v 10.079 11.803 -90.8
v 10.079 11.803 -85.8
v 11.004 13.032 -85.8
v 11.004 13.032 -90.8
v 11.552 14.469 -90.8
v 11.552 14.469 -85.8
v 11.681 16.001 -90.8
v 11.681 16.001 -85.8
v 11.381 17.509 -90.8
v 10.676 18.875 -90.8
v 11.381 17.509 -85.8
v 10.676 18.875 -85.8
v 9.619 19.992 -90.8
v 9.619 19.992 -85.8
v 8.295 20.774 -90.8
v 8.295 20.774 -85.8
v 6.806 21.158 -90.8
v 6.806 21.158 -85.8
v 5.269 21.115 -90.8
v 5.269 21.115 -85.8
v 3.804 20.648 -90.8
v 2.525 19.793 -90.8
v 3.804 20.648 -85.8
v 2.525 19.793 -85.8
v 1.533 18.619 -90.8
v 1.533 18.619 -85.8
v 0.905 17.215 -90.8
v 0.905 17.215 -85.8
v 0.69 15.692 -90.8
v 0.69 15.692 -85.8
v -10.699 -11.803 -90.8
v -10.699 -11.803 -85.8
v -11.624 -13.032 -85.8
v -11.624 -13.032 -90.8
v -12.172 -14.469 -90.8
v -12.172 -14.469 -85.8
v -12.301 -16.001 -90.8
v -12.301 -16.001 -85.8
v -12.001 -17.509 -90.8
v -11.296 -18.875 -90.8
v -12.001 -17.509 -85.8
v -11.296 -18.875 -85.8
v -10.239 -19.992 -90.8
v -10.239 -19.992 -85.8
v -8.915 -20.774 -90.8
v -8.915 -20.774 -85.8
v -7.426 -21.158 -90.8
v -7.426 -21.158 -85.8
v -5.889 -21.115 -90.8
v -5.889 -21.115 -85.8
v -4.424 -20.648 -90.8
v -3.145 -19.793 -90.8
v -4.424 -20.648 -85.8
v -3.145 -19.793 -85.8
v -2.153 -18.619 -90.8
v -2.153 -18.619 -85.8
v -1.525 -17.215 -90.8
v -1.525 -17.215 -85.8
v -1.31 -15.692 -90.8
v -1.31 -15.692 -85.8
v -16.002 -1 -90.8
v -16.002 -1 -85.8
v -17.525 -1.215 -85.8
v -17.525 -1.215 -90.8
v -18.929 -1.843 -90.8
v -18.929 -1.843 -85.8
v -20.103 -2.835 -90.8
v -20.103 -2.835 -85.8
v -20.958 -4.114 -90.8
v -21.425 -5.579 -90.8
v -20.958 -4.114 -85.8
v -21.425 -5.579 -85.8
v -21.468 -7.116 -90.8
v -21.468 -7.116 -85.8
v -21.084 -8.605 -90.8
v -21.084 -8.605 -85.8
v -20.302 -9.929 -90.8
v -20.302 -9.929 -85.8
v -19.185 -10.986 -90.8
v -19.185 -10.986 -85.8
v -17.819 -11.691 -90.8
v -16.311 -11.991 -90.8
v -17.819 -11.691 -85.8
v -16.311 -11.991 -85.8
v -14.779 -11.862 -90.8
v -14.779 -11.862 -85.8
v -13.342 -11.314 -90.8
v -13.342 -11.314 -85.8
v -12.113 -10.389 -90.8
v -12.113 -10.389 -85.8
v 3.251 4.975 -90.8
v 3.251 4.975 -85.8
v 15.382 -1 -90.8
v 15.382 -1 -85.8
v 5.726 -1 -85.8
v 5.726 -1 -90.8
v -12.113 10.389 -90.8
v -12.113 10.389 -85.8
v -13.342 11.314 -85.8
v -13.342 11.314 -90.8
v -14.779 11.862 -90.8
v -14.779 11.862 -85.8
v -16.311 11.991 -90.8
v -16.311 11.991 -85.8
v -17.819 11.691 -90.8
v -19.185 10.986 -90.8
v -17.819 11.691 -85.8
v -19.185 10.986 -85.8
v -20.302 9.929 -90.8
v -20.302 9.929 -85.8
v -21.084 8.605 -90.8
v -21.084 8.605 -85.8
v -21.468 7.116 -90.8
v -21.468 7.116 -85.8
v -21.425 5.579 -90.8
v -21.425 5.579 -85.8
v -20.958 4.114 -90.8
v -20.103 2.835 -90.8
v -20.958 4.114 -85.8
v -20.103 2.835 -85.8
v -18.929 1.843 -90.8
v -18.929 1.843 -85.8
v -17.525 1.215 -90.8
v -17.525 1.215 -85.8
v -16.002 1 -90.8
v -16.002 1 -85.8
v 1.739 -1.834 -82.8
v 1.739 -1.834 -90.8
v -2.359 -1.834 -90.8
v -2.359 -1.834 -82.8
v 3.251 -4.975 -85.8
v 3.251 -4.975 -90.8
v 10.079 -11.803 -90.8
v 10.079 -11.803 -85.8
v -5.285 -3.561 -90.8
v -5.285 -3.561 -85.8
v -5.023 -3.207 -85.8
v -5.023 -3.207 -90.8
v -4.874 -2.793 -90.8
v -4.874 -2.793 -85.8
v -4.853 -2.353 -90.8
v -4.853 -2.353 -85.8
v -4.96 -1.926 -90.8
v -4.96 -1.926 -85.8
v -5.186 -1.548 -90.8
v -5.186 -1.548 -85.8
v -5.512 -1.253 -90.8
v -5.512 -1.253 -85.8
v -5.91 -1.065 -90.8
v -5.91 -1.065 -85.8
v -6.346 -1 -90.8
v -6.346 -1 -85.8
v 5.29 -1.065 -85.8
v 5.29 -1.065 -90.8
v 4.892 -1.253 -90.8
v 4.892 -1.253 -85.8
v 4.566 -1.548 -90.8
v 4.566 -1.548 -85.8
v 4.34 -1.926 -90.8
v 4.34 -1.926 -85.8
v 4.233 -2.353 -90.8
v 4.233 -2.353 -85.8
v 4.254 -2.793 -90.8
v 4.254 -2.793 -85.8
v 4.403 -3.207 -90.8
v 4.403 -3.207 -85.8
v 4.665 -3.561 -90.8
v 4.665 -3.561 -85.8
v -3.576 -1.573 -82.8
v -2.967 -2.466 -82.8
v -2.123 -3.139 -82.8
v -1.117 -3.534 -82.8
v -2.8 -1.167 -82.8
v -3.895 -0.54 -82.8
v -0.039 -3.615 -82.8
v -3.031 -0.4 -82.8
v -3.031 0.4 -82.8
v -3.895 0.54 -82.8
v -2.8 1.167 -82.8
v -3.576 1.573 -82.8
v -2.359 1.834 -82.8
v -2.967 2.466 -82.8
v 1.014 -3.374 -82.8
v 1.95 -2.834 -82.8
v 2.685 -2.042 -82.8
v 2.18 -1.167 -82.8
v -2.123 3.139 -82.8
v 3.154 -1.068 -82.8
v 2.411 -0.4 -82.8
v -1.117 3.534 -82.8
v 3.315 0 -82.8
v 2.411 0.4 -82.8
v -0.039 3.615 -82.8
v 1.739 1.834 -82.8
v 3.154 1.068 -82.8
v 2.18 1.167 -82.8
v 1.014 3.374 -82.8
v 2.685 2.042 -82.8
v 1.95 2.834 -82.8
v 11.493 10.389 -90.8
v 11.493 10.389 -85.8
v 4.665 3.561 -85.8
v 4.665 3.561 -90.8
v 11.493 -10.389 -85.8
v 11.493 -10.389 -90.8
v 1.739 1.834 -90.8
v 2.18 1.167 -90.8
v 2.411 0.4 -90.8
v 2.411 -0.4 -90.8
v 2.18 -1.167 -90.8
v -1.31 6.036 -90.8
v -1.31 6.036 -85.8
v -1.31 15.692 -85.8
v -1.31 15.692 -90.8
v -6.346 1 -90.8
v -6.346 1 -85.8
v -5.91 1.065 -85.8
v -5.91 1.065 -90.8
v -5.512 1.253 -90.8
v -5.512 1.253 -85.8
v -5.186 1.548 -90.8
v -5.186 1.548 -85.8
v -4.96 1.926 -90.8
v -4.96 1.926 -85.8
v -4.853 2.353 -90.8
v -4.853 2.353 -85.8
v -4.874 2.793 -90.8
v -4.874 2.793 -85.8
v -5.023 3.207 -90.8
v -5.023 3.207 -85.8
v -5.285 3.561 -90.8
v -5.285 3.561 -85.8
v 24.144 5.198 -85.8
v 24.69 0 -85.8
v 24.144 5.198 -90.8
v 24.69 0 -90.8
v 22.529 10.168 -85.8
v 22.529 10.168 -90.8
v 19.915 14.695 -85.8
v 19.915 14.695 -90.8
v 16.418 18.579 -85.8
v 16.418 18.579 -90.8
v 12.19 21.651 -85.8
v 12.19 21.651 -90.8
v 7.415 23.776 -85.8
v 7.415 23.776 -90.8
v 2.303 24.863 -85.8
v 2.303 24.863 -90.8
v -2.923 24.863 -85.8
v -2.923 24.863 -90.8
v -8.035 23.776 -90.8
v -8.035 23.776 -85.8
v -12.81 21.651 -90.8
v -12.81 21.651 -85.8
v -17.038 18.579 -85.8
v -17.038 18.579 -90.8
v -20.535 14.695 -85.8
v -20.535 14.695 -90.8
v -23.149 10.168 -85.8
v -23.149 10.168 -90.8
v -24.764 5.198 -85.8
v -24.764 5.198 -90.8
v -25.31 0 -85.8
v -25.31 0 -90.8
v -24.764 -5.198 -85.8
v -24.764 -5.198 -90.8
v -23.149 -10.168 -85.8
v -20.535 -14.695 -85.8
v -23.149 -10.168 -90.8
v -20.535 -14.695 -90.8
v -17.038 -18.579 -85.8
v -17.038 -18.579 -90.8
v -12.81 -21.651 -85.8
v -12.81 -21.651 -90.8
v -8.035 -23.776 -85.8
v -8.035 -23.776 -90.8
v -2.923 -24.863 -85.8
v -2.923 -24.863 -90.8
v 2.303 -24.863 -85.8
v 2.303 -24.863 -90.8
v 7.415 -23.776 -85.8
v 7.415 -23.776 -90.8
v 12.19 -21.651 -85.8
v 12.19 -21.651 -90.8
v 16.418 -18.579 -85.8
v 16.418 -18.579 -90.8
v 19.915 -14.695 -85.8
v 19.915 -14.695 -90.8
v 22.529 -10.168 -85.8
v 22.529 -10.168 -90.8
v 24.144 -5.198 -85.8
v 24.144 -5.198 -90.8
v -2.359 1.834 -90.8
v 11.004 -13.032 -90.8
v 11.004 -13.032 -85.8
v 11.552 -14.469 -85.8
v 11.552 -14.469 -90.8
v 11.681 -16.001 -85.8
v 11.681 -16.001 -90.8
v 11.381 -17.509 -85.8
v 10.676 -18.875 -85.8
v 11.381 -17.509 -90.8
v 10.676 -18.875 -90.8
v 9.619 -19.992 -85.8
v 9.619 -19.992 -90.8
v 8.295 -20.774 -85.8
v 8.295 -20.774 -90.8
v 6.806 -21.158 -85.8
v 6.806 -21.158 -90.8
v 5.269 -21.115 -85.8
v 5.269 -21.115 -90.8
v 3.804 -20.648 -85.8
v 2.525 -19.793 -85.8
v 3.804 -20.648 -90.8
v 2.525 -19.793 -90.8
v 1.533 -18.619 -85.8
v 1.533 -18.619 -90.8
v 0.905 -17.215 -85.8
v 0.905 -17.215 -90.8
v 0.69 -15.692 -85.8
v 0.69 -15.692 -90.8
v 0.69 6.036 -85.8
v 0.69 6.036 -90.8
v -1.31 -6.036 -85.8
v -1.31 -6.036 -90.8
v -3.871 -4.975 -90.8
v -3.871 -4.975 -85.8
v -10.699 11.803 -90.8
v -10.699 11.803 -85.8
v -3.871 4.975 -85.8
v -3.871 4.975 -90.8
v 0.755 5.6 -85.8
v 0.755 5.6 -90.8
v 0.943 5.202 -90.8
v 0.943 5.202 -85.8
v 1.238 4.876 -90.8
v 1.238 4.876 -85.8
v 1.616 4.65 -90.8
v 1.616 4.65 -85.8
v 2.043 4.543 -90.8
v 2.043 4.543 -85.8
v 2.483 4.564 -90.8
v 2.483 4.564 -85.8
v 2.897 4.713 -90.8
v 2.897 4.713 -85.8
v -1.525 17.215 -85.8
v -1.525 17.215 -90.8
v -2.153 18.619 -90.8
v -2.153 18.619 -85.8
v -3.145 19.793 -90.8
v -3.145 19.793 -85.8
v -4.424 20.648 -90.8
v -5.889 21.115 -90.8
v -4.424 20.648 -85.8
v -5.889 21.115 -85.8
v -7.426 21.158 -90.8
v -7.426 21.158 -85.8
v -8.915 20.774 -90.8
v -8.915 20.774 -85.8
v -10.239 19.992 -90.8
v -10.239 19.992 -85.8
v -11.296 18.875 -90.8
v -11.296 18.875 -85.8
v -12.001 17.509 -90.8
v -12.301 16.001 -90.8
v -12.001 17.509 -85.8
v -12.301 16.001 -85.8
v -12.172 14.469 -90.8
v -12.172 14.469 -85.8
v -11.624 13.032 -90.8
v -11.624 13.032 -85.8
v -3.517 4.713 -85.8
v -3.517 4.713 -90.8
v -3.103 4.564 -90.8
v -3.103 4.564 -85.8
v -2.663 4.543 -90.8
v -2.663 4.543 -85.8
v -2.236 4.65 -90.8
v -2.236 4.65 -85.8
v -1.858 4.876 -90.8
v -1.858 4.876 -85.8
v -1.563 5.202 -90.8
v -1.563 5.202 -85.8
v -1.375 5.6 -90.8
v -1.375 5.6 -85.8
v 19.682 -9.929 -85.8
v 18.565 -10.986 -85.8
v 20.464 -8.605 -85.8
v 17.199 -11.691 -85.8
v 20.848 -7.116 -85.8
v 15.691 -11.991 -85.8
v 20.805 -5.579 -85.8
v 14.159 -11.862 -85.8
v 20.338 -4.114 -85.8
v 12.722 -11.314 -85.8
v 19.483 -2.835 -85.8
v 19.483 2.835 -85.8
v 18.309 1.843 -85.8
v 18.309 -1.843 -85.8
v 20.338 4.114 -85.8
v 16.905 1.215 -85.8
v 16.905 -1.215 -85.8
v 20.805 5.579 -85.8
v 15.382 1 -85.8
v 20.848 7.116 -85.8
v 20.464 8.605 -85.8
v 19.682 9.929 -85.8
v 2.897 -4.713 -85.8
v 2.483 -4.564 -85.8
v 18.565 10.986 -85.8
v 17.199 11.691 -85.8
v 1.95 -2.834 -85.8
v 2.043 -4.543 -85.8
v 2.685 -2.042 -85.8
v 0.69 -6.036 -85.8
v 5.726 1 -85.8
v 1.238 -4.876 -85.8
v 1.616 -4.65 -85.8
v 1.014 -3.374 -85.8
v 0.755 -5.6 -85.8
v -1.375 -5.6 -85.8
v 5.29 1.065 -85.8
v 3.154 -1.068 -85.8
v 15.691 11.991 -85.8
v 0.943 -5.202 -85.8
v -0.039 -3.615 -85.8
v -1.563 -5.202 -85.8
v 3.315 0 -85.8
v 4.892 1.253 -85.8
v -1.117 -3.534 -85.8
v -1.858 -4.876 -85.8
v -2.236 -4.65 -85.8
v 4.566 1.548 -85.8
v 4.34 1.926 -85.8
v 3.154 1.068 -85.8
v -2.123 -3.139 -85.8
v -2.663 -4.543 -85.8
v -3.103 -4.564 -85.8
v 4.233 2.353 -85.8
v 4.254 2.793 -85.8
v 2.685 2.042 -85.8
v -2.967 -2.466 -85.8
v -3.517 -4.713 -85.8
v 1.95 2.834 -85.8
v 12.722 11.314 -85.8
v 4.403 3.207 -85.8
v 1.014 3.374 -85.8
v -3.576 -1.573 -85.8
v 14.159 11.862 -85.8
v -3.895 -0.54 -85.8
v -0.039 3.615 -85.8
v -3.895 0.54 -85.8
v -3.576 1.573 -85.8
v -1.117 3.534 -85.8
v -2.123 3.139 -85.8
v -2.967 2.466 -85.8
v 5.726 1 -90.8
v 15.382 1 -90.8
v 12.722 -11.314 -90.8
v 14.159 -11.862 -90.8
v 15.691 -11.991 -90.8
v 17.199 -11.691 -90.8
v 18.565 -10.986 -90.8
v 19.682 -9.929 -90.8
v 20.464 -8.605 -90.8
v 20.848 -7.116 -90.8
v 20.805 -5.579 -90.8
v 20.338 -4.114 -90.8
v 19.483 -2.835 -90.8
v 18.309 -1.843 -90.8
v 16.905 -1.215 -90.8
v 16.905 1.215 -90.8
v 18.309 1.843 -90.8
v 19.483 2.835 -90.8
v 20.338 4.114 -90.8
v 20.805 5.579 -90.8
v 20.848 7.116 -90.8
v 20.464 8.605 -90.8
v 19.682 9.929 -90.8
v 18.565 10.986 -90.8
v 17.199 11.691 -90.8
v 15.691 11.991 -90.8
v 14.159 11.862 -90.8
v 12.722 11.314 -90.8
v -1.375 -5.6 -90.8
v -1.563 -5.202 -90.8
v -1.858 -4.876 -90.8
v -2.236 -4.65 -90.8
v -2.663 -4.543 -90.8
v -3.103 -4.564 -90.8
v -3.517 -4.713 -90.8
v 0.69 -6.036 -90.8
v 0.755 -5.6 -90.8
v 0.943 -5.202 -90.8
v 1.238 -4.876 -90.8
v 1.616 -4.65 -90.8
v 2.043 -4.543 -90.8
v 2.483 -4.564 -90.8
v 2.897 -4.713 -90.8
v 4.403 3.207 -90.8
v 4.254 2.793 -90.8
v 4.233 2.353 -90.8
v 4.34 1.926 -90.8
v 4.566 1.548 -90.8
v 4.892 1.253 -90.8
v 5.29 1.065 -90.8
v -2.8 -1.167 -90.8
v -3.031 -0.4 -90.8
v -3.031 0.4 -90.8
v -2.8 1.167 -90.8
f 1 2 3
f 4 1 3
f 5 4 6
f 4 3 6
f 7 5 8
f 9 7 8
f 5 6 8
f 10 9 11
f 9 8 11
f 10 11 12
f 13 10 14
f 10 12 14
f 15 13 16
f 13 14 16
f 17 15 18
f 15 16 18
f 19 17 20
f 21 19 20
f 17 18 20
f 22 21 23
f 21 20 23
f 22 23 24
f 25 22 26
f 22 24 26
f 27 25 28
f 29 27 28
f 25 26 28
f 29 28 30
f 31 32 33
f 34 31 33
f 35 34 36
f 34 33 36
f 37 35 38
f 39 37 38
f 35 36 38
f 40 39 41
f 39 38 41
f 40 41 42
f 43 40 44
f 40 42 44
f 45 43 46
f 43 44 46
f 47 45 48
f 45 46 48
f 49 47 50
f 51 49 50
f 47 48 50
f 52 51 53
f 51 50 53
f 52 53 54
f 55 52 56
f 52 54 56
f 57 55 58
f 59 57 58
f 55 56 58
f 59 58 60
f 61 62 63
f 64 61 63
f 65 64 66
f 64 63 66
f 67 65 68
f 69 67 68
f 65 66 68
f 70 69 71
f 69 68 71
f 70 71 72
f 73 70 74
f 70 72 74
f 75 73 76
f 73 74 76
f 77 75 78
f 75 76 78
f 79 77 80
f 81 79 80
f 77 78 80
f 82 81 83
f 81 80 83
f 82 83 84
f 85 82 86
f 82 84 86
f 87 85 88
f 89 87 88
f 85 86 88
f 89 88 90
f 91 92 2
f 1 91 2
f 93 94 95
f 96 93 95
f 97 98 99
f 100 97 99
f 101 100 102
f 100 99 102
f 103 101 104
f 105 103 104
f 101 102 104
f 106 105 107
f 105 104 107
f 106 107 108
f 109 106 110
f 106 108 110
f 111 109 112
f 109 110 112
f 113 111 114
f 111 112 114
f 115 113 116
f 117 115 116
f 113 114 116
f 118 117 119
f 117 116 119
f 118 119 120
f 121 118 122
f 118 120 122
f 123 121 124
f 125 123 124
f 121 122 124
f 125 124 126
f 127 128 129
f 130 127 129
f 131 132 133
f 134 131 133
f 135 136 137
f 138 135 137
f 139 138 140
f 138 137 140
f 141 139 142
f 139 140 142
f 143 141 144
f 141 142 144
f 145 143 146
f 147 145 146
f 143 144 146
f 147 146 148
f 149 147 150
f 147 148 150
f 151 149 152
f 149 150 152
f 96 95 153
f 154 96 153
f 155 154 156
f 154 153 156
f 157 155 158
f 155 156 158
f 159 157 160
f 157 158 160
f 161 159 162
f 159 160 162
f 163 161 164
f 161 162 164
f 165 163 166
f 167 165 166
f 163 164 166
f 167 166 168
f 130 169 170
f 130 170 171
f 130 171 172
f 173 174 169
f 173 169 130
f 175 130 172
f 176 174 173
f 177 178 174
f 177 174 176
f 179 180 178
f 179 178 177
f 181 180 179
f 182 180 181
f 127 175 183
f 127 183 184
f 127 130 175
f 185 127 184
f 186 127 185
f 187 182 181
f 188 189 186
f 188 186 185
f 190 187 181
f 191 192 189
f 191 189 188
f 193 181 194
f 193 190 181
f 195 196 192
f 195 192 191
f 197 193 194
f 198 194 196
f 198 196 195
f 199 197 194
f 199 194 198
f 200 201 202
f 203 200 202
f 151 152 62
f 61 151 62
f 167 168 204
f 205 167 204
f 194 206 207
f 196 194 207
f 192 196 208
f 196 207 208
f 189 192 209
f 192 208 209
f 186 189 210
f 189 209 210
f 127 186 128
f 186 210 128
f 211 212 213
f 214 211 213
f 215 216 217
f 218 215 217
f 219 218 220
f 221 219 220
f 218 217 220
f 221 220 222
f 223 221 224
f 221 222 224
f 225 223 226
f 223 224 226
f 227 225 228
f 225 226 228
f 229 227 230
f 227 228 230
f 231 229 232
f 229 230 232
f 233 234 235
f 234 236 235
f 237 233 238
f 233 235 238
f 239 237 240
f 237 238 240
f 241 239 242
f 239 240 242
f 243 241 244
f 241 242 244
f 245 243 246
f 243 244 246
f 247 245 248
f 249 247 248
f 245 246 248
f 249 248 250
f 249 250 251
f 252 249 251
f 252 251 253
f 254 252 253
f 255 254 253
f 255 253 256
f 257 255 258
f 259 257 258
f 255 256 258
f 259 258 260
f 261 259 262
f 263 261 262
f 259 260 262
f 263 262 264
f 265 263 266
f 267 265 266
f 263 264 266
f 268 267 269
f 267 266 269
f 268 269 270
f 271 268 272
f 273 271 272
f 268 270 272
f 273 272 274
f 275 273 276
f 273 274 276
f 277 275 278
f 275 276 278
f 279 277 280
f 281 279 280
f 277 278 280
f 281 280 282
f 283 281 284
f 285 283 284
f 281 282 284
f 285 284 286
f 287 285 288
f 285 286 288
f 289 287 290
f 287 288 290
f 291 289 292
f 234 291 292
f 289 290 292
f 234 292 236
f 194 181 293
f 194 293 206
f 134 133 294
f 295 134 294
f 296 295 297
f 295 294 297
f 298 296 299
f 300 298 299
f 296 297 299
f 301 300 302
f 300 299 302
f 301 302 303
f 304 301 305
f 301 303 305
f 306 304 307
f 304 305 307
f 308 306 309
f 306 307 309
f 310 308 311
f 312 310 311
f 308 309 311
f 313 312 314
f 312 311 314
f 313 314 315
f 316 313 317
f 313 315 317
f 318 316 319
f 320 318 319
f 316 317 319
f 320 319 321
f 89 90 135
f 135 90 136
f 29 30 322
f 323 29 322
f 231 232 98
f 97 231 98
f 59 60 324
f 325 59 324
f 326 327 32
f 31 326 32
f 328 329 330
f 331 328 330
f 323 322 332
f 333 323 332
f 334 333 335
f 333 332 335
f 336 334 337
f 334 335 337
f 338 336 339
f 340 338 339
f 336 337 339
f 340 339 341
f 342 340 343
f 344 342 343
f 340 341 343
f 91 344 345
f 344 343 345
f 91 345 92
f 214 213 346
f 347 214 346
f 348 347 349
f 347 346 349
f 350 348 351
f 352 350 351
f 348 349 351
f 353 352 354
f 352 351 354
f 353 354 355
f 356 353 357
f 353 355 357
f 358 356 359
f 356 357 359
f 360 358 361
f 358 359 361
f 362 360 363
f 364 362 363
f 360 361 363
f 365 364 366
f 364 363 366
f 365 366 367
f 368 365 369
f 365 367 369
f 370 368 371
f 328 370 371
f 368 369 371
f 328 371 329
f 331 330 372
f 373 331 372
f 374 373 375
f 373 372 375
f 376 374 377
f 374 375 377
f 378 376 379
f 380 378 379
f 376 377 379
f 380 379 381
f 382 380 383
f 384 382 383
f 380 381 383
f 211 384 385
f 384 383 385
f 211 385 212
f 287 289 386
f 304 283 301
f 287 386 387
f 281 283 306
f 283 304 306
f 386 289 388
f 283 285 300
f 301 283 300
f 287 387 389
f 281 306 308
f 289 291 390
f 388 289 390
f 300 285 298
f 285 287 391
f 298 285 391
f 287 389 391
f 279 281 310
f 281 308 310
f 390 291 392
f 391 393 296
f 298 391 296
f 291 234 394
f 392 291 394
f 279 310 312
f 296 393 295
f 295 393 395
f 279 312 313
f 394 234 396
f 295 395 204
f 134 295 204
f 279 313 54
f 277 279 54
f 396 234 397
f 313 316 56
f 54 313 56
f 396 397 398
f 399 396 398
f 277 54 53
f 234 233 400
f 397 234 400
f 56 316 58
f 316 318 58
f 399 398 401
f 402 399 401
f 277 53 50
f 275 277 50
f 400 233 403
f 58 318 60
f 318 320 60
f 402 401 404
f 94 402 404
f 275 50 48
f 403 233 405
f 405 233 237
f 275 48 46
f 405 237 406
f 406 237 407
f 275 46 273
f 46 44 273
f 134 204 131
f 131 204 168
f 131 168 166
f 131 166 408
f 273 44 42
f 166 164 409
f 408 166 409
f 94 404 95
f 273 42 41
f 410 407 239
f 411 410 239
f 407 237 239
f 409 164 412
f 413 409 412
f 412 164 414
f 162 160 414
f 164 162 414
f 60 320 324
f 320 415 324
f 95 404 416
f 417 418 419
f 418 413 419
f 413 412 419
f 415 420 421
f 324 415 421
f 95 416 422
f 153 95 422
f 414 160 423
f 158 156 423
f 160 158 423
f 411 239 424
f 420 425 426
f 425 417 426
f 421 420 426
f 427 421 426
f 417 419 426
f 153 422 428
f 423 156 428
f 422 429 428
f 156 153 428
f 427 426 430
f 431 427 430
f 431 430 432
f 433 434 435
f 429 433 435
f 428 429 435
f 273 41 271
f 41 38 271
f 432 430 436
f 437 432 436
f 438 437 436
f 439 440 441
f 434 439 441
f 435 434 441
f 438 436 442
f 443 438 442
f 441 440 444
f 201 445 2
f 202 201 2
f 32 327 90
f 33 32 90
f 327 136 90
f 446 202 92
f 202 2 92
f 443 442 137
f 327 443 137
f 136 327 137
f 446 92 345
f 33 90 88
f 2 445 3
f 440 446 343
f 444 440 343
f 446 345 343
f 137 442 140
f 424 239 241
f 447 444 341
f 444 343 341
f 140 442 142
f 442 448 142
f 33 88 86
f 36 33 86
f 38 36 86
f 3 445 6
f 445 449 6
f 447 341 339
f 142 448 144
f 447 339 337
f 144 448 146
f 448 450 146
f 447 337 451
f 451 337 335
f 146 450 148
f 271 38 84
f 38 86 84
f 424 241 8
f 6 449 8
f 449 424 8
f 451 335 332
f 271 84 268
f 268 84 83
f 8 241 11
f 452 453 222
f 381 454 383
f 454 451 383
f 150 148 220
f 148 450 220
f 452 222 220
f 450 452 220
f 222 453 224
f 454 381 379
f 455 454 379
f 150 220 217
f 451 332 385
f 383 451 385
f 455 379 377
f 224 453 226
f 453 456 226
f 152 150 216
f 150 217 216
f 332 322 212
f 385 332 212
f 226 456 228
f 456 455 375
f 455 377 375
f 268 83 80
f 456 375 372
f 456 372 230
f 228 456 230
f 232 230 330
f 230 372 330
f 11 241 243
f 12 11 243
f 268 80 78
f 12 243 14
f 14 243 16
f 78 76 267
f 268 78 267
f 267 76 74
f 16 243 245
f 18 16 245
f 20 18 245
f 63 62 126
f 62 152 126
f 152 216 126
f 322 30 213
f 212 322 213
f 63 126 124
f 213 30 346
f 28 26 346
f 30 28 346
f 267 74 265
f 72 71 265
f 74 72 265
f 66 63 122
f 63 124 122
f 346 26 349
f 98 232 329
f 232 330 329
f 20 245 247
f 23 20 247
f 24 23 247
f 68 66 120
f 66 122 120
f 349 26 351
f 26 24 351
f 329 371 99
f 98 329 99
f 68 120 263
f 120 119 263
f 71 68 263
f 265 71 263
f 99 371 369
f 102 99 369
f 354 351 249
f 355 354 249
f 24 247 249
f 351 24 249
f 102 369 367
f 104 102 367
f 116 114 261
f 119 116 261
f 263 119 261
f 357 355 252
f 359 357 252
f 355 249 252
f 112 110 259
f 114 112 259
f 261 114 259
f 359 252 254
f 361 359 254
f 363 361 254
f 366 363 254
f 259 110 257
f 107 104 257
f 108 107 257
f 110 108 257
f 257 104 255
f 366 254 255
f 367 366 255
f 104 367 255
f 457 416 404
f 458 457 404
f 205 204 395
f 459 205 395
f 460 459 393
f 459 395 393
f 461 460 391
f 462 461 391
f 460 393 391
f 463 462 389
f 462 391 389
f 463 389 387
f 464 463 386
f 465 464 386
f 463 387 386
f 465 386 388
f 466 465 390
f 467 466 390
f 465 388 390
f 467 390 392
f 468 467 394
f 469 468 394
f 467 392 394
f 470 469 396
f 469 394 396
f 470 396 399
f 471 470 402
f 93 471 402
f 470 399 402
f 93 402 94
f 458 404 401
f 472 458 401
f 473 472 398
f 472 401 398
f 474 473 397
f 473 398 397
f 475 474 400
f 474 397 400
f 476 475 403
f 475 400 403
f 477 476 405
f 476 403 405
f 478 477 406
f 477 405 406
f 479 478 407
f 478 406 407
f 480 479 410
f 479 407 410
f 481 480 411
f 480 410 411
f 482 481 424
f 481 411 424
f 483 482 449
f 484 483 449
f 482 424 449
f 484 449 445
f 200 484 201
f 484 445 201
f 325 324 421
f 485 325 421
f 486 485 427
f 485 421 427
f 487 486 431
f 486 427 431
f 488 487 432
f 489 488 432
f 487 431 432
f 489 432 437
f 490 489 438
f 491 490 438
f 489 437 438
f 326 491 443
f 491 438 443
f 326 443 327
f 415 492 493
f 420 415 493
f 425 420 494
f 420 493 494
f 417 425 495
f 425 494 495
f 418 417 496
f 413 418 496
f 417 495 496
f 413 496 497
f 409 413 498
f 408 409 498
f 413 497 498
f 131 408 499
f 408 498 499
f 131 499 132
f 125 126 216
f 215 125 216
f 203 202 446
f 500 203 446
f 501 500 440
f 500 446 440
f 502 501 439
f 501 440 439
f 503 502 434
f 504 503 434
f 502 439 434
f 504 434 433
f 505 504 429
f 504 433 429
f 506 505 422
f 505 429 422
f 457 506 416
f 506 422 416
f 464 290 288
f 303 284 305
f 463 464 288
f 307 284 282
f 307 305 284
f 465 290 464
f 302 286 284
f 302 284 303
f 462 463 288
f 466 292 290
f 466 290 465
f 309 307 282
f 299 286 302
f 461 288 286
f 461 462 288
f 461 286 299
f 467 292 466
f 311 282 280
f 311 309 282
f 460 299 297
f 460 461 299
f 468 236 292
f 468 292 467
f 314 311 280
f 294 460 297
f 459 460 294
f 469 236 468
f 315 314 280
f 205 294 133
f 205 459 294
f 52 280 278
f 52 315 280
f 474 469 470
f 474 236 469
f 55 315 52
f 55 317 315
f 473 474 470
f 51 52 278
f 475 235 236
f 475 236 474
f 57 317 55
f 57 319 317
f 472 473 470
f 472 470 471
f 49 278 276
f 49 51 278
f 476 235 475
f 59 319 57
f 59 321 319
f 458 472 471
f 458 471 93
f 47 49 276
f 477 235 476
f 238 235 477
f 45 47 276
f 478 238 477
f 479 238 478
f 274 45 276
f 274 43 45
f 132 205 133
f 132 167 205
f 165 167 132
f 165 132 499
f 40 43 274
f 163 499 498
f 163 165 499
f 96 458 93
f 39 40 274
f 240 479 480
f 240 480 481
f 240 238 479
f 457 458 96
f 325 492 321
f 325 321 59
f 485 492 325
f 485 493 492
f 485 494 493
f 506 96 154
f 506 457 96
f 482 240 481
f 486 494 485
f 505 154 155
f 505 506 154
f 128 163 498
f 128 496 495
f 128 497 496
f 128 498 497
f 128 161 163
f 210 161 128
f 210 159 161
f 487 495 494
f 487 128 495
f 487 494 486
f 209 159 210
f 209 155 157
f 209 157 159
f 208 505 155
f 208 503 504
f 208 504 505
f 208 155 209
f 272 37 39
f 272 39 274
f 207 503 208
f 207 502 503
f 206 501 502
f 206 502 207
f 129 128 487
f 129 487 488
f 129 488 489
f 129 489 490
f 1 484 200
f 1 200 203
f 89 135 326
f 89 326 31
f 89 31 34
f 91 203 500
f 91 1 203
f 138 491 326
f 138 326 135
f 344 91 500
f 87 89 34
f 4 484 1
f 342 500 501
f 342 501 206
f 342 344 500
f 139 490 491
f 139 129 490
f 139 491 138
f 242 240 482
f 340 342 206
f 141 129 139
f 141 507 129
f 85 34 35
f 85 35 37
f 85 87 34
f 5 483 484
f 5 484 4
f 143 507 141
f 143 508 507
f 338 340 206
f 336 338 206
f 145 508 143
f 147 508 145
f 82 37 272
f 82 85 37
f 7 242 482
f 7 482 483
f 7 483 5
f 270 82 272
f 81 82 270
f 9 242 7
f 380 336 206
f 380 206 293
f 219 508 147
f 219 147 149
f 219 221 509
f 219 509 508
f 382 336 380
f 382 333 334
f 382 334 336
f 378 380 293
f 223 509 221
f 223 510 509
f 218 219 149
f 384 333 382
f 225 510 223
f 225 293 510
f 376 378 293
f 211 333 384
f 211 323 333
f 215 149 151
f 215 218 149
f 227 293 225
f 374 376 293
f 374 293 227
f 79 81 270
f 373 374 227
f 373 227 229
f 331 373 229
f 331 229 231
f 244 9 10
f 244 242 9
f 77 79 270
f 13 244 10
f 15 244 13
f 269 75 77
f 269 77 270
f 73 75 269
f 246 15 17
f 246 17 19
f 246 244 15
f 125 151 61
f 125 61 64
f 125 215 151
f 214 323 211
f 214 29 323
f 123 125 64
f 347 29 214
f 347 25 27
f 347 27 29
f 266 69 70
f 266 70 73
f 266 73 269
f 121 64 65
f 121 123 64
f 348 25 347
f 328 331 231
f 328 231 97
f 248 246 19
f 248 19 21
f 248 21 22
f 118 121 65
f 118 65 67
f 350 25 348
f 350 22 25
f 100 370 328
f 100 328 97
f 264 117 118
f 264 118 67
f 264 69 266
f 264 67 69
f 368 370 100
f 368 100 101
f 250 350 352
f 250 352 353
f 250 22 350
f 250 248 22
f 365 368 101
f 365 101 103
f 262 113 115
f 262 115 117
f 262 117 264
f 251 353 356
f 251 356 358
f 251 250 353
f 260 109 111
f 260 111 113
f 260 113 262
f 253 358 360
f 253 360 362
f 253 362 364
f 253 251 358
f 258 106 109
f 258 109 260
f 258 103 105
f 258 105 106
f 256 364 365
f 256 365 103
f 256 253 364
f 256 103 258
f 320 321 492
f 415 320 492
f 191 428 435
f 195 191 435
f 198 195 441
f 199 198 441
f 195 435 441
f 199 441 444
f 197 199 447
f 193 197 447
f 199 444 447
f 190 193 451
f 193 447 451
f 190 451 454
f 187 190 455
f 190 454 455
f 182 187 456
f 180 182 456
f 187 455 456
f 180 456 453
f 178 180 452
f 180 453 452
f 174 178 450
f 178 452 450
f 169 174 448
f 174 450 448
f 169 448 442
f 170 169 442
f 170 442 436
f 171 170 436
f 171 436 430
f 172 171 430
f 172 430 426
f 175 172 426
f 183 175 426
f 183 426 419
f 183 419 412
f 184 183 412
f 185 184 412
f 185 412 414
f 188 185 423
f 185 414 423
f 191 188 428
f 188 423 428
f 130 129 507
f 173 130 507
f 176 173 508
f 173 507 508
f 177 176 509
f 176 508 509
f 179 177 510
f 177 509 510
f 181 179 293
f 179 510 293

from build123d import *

# Parameters (mm, degrees)
SKETCH1_W           = 25
SKETCH1_H           = 5
SKETCH2_R           = 3.625
BOSS_EXTRUDE1_DEPTH = 3
CUT_EXTRUDE1_DEPTH  = 37.463627082
CUT_EXTRUDE2_DEPTH  = 36.924867432
CUT_EXTRUDE3_DEPTH  = 36.924867432
CUT_EXTRUDE4_DEPTH  = 36.924867432
CUT_EXTRUDE5_DEPTH  = 36.924867432
CUT_EXTRUDE6_DEPTH  = 36.924867432
CUT_EXTRUDE7_DEPTH  = 36.924867432
CUT_EXTRUDE8_DEPTH  = 36.924867432
CUT_EXTRUDE9_DEPTH  = 37.463627082


with BuildPart() as part:
    # Sketch1 → Revolve1 (revolve)
    with BuildSketch(Plane(origin=(0, 0, 0), x_dir=(1, 0, 0), z_dir=(0, 1, 0))):
        with Locations((12.19, 88.3)):
            Rectangle(SKETCH1_W, SKETCH1_H)
    revolve(axis=Axis((-0.31, 0, -90.8), (0, 0, 1)))

    # Sketch2 → Boss-Extrude1 (add)
    with BuildSketch(Plane.XY.offset(-85.8)):
        with Locations((-0.31, 0)):
            Circle(SKETCH2_R)
    extrude(amount=BOSS_EXTRUDE1_DEPTH)

    # Sketch3 → Cut-Extrude1 (cut, through all)
    with BuildSketch(Plane(origin=(0, 0, -90.8), x_dir=(-1, 0, 0), z_dir=(0, 0, -1))):
        with BuildLine():
            Line((-1.738954013, -1.834199404), (2.358954013, -1.834199404))
            ThreePointArc((2.358954013, -1.834199404), (3.06, 0), (2.358954013, 1.834199404))
            Line((2.358954013, 1.834199404), (-1.738954013, 1.834199404))
            ThreePointArc((-1.738954013, 1.834199404), (-2.44, 0), (-1.738954013, -1.834199404))
        make_face()
    extrude(amount=-CUT_EXTRUDE1_DEPTH, mode=Mode.SUBTRACT)

    # Sketch4 → Cut-Extrude2 (cut, through all)
    with BuildSketch(Plane.XY.offset(-85.8)):
        with BuildLine():
            Line((5.725533906, 1), (15.382388155, 1))
            ThreePointArc((15.382388155, 1), (20.463725584, 8.604758878), (11.493300859, 10.389087297))
            Line((11.493300859, 10.389087297), (4.664873734, 3.560660172))
            ThreePointArc((4.664873734, 3.560660172), (4.339714607, 1.925974851), (5.725533906, 1))
        make_face()
    extrude(amount=-CUT_EXTRUDE2_DEPTH, mode=Mode.SUBTRACT)

    # Sketch5 → Cut-Extrude3 (cut, through all)
    with BuildSketch(Plane.XY.offset(-85.8)):
        with BuildLine():
            Line((-12.113300859, -10.389087297), (-5.284873734, -3.560660172))
            ThreePointArc((-5.284873734, -3.560660172), (-4.959714607, -1.925974851), (-6.345533906, -1))
            Line((-6.345533906, -1), (-16.002388155, -1))
            ThreePointArc((-16.002388155, -1), (-21.083725584, -8.604758878), (-12.113300859, -10.389087297))
        make_face()
    extrude(amount=-CUT_EXTRUDE3_DEPTH, mode=Mode.SUBTRACT)

    # Sketch6 → Cut-Extrude4 (cut, through all)
    with BuildSketch(Plane.XY.offset(-85.8)):
        with BuildLine():
            Line((3.250660172, 4.974873734), (10.079087297, 11.803300859))
            ThreePointArc((10.079087297, 11.803300859), (8.294758878, 20.773725584), (0.69, 15.692388155))
            Line((0.69, 15.692388155), (0.69, 6.035533906))
            ThreePointArc((0.69, 6.035533906), (1.615974851, 4.649714607), (3.250660172, 4.974873734))
        make_face()
    extrude(amount=-CUT_EXTRUDE4_DEPTH, mode=Mode.SUBTRACT)

    # Sketch7 → Cut-Extrude5 (cut, through all)
    with BuildSketch(Plane.XY.offset(-85.8)):
        with BuildLine():
            Line((-3.870660172, -4.974873734), (-10.699087297, -11.803300859))
            ThreePointArc((-10.699087297, -11.803300859), (-8.914758878, -20.773725584), (-1.31, -15.692388155))
            Line((-1.31, -15.692388155), (-1.31, -6.035533906))
            ThreePointArc((-1.31, -6.035533906), (-2.235974851, -4.649714607), (-3.870660172, -4.974873734))
        make_face()
    extrude(amount=-CUT_EXTRUDE5_DEPTH, mode=Mode.SUBTRACT)

    # Sketch8 → Cut-Extrude6 (cut, through all)
    with BuildSketch(Plane.XY.offset(-85.8)):
        with BuildLine():
            Line((15.382388155, -1), (5.725533906, -1))
            ThreePointArc((5.725533906, -1), (4.339714607, -1.925974851), (4.664873734, -3.560660172))
            Line((4.664873734, -3.560660172), (11.493300859, -10.389087297))
            ThreePointArc((11.493300859, -10.389087297), (20.463725584, -8.604758878), (15.382388155, -1))
        make_face()
    extrude(amount=-CUT_EXTRUDE6_DEPTH, mode=Mode.SUBTRACT)

    # Sketch9 → Cut-Extrude7 (cut, through all)
    with BuildSketch(Plane.XY.offset(-85.8)):
        with BuildLine():
            Line((-16.002388155, 1), (-6.345533906, 1))
            ThreePointArc((-6.345533906, 1), (-4.959714607, 1.925974851), (-5.284873734, 3.560660172))
            Line((-5.284873734, 3.560660172), (-12.113300859, 10.389087297))
            ThreePointArc((-12.113300859, 10.389087297), (-21.083725584, 8.604758878), (-16.002388155, 1))
        make_face()
    extrude(amount=-CUT_EXTRUDE7_DEPTH, mode=Mode.SUBTRACT)

    # Sketch10 → Cut-Extrude8 (cut, through all)
    with BuildSketch(Plane.XY.offset(-85.8)):
        with BuildLine():
            Line((-1.31, 6.035533906), (-1.31, 15.692388155))
            ThreePointArc((-1.31, 15.692388155), (-8.914758878, 20.773725584), (-10.699087297, 11.803300859))
            Line((-10.699087297, 11.803300859), (-3.870660172, 4.974873734))
            ThreePointArc((-3.870660172, 4.974873734), (-2.235974851, 4.649714607), (-1.31, 6.035533906))
        make_face()
    extrude(amount=-CUT_EXTRUDE8_DEPTH, mode=Mode.SUBTRACT)

    # Sketch11 → Cut-Extrude9 (cut, through all)
    with BuildSketch(Plane(origin=(0, 0, -90.8), x_dir=(-1, 0, 0), z_dir=(0, 0, -1))):
        with BuildLine():
            Line((-0.69, -15.692388155), (-0.69, -6.035533906))
            ThreePointArc((-0.69, -6.035533906), (-1.615974851, -4.649714607), (-3.250660172, -4.974873734))
            Line((-3.250660172, -4.974873734), (-10.079087297, -11.803300859))
            ThreePointArc((-10.079087297, -11.803300859), (-8.294758878, -20.773725584), (-0.69, -15.692388155))
        make_face()
    extrude(amount=-CUT_EXTRUDE9_DEPTH, mode=Mode.SUBTRACT)


solid = part.part
